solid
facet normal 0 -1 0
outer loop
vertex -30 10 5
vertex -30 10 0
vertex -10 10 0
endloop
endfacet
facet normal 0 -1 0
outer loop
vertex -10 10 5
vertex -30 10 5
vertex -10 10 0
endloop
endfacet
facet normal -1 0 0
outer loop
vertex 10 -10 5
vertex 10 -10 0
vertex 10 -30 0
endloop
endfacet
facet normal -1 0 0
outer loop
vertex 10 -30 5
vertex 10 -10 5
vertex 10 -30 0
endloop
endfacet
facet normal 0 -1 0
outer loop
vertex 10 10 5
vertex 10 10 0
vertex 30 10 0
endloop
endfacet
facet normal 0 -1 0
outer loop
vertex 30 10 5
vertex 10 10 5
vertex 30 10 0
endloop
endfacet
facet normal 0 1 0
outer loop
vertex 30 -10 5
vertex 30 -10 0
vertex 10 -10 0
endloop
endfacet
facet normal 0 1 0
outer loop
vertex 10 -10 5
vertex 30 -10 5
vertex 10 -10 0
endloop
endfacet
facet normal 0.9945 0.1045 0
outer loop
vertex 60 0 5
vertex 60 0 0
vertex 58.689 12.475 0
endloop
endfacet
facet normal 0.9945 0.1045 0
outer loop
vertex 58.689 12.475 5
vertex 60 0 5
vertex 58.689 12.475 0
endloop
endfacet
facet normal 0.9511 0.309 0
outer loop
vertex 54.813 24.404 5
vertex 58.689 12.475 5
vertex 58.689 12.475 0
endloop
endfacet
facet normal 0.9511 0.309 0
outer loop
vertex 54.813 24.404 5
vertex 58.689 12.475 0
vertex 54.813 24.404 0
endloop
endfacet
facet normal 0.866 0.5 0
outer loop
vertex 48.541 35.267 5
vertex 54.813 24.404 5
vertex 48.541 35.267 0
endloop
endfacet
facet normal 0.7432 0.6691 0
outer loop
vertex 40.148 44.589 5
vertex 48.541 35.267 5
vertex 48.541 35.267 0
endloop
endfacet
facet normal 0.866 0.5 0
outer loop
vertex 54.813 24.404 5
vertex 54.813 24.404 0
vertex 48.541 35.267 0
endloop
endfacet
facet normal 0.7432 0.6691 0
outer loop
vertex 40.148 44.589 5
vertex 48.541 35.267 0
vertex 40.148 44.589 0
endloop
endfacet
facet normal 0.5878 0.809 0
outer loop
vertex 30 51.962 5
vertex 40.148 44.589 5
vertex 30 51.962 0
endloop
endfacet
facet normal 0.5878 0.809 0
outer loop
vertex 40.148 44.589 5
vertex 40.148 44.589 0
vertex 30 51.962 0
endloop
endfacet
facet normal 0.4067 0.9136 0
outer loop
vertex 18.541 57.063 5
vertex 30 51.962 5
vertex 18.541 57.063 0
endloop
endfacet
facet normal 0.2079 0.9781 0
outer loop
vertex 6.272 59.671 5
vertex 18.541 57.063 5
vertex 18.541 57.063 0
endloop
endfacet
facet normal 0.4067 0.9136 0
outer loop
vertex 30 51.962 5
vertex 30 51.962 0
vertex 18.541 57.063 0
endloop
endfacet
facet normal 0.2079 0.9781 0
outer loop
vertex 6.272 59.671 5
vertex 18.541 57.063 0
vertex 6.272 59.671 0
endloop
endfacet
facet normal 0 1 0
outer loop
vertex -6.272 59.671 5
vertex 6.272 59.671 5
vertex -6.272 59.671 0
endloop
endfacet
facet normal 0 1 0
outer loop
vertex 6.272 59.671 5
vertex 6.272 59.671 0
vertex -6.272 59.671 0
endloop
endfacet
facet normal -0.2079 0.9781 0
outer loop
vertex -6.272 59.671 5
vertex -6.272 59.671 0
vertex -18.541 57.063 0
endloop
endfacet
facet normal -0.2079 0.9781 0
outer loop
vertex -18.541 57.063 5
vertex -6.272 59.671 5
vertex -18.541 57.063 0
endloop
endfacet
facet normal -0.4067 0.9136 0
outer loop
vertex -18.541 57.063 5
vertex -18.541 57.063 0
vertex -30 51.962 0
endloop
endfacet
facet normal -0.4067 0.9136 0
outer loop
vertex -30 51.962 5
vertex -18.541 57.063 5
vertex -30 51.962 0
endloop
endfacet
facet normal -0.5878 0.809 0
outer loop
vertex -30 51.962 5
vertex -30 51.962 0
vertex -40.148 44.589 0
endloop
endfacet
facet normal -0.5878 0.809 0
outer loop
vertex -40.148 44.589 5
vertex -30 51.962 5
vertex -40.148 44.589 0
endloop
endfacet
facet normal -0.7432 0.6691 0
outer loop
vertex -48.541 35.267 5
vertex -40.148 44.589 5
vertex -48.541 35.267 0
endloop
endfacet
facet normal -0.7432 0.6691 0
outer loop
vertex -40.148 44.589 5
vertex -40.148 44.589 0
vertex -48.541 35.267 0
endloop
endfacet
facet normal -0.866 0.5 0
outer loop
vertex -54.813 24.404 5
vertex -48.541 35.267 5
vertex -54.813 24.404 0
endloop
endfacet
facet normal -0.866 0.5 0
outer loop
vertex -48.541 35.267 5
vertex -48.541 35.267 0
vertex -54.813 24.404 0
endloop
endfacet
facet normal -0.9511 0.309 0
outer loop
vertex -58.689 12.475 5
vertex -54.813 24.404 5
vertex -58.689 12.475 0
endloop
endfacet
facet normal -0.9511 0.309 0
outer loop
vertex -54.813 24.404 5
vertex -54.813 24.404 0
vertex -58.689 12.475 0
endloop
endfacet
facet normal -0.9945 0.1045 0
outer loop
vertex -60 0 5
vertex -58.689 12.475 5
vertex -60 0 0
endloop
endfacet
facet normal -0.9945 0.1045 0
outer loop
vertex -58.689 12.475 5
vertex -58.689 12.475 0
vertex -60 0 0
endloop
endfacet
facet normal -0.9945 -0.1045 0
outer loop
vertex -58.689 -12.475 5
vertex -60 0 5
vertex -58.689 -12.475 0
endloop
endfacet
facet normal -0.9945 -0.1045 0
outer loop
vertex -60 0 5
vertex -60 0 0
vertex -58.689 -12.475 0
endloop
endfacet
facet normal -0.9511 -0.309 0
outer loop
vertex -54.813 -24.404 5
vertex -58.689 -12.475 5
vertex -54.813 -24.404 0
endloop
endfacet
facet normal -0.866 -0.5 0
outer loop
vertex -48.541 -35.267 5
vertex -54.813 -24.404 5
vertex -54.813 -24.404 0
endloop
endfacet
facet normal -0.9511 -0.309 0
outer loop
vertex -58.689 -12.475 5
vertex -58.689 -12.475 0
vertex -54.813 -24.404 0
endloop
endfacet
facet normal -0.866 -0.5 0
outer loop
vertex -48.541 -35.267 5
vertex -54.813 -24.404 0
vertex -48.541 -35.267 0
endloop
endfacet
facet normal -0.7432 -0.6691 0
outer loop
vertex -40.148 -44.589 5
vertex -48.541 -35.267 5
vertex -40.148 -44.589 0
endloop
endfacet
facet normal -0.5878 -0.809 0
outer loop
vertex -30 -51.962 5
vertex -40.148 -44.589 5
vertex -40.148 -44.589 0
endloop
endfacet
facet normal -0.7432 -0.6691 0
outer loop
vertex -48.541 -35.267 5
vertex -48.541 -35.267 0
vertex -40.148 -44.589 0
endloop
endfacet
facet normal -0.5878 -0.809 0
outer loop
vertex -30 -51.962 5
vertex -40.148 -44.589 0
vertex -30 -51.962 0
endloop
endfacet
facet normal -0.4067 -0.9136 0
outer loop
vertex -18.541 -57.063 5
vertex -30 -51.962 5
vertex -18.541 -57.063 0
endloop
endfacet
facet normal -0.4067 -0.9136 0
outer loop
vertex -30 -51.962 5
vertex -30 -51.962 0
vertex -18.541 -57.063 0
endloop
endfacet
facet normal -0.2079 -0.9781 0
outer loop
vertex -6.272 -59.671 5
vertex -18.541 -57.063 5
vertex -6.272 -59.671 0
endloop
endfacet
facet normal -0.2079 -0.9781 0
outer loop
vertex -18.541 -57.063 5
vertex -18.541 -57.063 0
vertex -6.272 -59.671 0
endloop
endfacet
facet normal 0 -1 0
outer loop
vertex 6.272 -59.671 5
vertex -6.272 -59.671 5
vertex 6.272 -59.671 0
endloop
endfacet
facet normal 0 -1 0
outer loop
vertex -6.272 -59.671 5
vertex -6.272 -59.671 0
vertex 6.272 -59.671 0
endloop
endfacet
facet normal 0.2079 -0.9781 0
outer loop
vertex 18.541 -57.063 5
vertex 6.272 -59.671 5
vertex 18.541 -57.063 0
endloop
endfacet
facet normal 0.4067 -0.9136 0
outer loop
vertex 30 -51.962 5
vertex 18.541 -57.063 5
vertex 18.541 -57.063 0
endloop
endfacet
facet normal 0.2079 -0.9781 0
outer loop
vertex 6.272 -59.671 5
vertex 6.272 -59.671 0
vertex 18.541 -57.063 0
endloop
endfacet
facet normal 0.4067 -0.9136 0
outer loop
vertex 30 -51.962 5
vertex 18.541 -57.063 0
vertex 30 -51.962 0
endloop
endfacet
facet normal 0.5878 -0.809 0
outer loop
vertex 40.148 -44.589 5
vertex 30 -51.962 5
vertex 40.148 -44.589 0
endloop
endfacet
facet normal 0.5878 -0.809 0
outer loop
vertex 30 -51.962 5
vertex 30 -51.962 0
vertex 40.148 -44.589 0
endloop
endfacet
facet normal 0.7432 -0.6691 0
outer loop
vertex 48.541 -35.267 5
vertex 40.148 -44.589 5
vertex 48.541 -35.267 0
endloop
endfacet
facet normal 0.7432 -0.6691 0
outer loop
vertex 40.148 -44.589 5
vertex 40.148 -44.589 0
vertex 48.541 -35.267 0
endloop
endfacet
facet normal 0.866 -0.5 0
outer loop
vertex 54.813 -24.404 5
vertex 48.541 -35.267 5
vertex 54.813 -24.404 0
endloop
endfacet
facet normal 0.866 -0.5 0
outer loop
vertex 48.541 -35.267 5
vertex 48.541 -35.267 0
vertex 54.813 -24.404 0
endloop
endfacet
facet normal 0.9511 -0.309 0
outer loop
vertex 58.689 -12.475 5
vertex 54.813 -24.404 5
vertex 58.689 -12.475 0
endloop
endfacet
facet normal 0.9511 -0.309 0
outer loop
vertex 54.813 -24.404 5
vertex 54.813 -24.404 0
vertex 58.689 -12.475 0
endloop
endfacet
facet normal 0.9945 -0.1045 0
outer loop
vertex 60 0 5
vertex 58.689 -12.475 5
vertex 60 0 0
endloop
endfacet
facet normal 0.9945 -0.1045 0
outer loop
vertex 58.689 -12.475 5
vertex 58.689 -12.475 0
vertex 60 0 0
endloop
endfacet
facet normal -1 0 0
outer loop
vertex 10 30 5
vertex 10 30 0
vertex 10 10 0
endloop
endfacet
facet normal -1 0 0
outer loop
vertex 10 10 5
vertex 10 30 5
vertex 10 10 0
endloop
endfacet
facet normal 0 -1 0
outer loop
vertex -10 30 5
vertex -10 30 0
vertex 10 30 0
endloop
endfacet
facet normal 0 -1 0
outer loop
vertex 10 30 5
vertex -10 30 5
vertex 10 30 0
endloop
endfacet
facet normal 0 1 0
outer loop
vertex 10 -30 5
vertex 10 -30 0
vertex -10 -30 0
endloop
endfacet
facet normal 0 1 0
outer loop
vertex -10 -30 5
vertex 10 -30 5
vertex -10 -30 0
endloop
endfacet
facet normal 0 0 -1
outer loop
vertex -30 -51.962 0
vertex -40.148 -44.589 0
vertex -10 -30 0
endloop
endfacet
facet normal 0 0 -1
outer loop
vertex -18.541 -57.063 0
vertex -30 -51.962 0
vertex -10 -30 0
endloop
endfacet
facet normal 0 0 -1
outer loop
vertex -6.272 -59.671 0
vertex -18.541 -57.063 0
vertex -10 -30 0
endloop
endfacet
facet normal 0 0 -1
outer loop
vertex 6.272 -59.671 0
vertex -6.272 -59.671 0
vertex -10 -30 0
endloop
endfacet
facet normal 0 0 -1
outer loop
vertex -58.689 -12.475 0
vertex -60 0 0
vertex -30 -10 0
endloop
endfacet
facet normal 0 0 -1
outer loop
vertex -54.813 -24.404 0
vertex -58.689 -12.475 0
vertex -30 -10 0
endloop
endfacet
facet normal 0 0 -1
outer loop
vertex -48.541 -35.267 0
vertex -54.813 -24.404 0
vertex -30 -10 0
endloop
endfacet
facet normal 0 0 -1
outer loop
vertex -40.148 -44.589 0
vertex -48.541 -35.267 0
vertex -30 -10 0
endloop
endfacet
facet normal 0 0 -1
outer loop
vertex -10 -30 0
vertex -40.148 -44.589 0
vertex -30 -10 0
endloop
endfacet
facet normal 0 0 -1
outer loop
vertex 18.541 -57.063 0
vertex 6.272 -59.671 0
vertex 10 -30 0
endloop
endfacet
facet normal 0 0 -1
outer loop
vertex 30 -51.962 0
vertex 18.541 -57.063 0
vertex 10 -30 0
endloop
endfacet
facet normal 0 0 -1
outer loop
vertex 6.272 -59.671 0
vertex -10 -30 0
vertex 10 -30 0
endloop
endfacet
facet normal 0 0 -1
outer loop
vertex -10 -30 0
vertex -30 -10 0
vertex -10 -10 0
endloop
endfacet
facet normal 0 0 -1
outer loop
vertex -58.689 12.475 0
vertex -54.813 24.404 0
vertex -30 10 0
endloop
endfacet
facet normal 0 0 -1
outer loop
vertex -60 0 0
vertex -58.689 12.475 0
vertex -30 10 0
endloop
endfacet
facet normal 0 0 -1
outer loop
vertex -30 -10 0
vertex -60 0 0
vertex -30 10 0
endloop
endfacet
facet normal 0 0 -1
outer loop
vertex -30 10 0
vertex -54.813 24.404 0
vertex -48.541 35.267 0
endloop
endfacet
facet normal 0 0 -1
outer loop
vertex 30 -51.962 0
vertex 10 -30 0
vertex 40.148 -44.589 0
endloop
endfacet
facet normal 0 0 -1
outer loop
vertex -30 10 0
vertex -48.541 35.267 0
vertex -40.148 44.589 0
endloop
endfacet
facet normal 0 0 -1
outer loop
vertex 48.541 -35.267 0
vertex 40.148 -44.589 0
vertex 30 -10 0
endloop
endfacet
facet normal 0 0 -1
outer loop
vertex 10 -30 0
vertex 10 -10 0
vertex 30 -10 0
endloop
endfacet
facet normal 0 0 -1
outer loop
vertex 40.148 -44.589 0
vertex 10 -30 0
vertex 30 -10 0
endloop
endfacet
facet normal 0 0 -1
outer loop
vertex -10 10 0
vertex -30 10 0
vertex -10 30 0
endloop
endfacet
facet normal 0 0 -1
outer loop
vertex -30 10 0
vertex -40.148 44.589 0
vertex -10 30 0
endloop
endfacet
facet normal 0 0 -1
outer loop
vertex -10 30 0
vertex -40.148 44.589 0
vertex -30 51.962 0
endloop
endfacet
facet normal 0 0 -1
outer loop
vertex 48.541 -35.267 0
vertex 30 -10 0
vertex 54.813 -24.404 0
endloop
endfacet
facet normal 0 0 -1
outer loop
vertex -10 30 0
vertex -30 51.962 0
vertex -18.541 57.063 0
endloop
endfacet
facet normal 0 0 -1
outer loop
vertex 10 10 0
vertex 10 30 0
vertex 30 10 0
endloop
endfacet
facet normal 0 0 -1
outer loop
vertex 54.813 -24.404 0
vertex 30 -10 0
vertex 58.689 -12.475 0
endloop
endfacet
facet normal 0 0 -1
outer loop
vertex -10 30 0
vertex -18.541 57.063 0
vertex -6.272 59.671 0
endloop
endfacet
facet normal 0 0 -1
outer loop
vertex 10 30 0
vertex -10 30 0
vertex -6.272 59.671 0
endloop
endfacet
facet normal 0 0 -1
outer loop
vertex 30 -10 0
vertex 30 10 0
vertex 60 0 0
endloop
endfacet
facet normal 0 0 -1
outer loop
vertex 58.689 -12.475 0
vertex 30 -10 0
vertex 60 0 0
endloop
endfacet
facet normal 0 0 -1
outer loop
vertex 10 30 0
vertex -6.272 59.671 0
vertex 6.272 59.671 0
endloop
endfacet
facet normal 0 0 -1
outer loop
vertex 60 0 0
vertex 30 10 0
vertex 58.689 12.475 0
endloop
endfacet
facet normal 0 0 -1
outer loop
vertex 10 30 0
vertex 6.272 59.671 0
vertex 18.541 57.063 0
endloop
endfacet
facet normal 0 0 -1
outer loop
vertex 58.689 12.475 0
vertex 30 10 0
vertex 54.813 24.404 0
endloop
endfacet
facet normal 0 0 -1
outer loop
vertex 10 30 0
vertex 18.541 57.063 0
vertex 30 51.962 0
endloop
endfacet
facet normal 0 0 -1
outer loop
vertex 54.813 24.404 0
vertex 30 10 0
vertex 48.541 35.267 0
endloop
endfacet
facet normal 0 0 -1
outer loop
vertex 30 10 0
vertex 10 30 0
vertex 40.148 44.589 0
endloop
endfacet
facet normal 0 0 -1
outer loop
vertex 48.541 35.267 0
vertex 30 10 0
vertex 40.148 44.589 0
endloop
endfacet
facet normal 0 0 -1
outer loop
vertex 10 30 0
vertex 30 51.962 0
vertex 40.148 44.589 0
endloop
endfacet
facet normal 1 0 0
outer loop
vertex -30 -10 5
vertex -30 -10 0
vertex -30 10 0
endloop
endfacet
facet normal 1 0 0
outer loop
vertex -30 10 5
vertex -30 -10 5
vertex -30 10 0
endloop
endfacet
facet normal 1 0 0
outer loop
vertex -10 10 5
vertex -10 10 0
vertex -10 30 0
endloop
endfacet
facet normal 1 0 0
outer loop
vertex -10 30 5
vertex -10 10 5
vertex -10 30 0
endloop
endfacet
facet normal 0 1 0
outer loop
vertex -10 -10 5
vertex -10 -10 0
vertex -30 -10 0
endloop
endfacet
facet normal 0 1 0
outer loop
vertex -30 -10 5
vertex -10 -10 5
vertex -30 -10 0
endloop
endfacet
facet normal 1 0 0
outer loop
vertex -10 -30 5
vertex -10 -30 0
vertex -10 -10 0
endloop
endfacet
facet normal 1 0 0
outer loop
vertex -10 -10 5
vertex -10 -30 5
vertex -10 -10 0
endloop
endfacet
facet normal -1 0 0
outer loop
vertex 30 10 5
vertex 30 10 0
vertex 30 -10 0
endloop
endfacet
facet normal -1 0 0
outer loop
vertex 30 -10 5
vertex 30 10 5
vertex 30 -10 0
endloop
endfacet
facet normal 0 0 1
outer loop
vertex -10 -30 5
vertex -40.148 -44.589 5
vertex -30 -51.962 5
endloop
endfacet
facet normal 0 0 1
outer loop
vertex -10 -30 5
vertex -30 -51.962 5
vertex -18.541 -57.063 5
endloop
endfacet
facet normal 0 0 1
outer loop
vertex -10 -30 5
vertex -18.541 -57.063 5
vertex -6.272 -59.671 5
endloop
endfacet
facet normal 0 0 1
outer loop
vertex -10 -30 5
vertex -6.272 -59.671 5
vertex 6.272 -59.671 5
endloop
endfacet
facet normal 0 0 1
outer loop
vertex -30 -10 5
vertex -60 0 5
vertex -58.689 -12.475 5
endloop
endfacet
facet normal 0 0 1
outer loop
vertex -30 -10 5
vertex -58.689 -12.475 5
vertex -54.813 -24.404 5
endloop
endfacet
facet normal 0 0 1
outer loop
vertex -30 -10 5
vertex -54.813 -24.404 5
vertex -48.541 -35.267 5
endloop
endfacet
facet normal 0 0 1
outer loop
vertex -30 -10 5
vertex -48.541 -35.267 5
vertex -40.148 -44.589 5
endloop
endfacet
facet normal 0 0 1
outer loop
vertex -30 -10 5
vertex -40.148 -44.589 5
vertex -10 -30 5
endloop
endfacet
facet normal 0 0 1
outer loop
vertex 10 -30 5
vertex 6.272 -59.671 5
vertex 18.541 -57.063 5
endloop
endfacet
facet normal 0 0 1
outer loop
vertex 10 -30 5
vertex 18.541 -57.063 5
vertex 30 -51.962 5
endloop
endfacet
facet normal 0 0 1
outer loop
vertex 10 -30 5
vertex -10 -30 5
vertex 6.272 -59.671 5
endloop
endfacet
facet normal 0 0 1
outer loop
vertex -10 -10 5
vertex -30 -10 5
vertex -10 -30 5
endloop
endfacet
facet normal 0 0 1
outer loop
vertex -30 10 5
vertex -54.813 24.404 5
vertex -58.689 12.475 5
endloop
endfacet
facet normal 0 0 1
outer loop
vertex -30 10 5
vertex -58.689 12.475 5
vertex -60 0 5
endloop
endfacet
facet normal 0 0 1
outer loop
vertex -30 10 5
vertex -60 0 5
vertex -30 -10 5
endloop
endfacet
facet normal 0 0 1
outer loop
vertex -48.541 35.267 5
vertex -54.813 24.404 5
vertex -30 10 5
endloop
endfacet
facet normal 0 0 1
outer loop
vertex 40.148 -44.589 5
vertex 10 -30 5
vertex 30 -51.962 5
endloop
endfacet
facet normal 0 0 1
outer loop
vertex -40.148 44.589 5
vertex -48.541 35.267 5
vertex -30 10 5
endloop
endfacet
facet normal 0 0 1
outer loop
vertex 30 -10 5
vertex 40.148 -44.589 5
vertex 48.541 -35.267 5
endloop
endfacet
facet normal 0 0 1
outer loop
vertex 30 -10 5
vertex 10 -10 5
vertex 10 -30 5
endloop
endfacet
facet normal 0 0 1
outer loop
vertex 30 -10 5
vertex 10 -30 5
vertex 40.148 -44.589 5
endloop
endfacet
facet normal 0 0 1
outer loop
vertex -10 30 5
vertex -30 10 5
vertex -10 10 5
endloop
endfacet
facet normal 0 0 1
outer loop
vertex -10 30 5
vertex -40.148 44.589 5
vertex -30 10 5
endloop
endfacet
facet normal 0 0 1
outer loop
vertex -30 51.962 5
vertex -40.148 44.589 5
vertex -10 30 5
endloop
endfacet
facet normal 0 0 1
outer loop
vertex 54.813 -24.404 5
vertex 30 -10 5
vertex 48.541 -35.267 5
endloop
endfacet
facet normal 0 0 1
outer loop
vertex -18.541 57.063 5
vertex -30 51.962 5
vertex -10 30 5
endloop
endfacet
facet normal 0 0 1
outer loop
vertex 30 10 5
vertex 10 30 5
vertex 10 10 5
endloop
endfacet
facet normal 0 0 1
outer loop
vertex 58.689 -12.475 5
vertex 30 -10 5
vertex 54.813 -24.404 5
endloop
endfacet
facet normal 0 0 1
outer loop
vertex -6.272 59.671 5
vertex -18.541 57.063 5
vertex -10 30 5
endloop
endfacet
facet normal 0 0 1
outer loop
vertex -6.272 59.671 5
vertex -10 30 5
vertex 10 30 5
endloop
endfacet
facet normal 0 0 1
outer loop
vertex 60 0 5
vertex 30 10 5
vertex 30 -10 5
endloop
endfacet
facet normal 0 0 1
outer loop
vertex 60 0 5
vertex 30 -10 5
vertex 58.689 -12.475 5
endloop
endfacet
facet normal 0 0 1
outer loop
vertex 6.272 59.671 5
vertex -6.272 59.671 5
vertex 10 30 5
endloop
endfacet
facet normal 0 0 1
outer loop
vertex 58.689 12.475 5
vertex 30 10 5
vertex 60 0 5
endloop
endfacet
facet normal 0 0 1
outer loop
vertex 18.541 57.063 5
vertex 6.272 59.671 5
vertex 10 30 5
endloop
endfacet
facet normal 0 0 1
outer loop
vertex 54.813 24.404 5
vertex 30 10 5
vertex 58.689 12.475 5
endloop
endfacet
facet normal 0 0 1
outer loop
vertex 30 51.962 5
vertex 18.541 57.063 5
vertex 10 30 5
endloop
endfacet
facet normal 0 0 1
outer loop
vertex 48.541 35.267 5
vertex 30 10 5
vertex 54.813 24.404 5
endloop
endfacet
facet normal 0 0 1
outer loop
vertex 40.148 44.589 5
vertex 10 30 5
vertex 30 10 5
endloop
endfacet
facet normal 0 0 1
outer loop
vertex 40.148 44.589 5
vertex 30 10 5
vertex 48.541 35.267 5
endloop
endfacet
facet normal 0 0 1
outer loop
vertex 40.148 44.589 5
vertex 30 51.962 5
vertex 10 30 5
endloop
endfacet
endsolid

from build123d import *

# Parameters (mm, degrees)
F0_R     = 60
F1_DEPTH = 5


with BuildPart() as f1:
    # F0 (on Top) → F1 (new body)
    with BuildSketch(Plane.XY):
        Circle(F0_R)
        Polygon((-10, 30), (0, 30), (10, 30), (10, 10), (30, 10), (30, 0), (30, -10), (10, -10), (10, -30), (0, -30), (-10, -30), (-10, -10), (-30, -10), (-30, 0), (-30, 10), (-10, 10), align=None, mode=Mode.SUBTRACT)
    extrude(amount=F1_DEPTH)


solid = f1.part
